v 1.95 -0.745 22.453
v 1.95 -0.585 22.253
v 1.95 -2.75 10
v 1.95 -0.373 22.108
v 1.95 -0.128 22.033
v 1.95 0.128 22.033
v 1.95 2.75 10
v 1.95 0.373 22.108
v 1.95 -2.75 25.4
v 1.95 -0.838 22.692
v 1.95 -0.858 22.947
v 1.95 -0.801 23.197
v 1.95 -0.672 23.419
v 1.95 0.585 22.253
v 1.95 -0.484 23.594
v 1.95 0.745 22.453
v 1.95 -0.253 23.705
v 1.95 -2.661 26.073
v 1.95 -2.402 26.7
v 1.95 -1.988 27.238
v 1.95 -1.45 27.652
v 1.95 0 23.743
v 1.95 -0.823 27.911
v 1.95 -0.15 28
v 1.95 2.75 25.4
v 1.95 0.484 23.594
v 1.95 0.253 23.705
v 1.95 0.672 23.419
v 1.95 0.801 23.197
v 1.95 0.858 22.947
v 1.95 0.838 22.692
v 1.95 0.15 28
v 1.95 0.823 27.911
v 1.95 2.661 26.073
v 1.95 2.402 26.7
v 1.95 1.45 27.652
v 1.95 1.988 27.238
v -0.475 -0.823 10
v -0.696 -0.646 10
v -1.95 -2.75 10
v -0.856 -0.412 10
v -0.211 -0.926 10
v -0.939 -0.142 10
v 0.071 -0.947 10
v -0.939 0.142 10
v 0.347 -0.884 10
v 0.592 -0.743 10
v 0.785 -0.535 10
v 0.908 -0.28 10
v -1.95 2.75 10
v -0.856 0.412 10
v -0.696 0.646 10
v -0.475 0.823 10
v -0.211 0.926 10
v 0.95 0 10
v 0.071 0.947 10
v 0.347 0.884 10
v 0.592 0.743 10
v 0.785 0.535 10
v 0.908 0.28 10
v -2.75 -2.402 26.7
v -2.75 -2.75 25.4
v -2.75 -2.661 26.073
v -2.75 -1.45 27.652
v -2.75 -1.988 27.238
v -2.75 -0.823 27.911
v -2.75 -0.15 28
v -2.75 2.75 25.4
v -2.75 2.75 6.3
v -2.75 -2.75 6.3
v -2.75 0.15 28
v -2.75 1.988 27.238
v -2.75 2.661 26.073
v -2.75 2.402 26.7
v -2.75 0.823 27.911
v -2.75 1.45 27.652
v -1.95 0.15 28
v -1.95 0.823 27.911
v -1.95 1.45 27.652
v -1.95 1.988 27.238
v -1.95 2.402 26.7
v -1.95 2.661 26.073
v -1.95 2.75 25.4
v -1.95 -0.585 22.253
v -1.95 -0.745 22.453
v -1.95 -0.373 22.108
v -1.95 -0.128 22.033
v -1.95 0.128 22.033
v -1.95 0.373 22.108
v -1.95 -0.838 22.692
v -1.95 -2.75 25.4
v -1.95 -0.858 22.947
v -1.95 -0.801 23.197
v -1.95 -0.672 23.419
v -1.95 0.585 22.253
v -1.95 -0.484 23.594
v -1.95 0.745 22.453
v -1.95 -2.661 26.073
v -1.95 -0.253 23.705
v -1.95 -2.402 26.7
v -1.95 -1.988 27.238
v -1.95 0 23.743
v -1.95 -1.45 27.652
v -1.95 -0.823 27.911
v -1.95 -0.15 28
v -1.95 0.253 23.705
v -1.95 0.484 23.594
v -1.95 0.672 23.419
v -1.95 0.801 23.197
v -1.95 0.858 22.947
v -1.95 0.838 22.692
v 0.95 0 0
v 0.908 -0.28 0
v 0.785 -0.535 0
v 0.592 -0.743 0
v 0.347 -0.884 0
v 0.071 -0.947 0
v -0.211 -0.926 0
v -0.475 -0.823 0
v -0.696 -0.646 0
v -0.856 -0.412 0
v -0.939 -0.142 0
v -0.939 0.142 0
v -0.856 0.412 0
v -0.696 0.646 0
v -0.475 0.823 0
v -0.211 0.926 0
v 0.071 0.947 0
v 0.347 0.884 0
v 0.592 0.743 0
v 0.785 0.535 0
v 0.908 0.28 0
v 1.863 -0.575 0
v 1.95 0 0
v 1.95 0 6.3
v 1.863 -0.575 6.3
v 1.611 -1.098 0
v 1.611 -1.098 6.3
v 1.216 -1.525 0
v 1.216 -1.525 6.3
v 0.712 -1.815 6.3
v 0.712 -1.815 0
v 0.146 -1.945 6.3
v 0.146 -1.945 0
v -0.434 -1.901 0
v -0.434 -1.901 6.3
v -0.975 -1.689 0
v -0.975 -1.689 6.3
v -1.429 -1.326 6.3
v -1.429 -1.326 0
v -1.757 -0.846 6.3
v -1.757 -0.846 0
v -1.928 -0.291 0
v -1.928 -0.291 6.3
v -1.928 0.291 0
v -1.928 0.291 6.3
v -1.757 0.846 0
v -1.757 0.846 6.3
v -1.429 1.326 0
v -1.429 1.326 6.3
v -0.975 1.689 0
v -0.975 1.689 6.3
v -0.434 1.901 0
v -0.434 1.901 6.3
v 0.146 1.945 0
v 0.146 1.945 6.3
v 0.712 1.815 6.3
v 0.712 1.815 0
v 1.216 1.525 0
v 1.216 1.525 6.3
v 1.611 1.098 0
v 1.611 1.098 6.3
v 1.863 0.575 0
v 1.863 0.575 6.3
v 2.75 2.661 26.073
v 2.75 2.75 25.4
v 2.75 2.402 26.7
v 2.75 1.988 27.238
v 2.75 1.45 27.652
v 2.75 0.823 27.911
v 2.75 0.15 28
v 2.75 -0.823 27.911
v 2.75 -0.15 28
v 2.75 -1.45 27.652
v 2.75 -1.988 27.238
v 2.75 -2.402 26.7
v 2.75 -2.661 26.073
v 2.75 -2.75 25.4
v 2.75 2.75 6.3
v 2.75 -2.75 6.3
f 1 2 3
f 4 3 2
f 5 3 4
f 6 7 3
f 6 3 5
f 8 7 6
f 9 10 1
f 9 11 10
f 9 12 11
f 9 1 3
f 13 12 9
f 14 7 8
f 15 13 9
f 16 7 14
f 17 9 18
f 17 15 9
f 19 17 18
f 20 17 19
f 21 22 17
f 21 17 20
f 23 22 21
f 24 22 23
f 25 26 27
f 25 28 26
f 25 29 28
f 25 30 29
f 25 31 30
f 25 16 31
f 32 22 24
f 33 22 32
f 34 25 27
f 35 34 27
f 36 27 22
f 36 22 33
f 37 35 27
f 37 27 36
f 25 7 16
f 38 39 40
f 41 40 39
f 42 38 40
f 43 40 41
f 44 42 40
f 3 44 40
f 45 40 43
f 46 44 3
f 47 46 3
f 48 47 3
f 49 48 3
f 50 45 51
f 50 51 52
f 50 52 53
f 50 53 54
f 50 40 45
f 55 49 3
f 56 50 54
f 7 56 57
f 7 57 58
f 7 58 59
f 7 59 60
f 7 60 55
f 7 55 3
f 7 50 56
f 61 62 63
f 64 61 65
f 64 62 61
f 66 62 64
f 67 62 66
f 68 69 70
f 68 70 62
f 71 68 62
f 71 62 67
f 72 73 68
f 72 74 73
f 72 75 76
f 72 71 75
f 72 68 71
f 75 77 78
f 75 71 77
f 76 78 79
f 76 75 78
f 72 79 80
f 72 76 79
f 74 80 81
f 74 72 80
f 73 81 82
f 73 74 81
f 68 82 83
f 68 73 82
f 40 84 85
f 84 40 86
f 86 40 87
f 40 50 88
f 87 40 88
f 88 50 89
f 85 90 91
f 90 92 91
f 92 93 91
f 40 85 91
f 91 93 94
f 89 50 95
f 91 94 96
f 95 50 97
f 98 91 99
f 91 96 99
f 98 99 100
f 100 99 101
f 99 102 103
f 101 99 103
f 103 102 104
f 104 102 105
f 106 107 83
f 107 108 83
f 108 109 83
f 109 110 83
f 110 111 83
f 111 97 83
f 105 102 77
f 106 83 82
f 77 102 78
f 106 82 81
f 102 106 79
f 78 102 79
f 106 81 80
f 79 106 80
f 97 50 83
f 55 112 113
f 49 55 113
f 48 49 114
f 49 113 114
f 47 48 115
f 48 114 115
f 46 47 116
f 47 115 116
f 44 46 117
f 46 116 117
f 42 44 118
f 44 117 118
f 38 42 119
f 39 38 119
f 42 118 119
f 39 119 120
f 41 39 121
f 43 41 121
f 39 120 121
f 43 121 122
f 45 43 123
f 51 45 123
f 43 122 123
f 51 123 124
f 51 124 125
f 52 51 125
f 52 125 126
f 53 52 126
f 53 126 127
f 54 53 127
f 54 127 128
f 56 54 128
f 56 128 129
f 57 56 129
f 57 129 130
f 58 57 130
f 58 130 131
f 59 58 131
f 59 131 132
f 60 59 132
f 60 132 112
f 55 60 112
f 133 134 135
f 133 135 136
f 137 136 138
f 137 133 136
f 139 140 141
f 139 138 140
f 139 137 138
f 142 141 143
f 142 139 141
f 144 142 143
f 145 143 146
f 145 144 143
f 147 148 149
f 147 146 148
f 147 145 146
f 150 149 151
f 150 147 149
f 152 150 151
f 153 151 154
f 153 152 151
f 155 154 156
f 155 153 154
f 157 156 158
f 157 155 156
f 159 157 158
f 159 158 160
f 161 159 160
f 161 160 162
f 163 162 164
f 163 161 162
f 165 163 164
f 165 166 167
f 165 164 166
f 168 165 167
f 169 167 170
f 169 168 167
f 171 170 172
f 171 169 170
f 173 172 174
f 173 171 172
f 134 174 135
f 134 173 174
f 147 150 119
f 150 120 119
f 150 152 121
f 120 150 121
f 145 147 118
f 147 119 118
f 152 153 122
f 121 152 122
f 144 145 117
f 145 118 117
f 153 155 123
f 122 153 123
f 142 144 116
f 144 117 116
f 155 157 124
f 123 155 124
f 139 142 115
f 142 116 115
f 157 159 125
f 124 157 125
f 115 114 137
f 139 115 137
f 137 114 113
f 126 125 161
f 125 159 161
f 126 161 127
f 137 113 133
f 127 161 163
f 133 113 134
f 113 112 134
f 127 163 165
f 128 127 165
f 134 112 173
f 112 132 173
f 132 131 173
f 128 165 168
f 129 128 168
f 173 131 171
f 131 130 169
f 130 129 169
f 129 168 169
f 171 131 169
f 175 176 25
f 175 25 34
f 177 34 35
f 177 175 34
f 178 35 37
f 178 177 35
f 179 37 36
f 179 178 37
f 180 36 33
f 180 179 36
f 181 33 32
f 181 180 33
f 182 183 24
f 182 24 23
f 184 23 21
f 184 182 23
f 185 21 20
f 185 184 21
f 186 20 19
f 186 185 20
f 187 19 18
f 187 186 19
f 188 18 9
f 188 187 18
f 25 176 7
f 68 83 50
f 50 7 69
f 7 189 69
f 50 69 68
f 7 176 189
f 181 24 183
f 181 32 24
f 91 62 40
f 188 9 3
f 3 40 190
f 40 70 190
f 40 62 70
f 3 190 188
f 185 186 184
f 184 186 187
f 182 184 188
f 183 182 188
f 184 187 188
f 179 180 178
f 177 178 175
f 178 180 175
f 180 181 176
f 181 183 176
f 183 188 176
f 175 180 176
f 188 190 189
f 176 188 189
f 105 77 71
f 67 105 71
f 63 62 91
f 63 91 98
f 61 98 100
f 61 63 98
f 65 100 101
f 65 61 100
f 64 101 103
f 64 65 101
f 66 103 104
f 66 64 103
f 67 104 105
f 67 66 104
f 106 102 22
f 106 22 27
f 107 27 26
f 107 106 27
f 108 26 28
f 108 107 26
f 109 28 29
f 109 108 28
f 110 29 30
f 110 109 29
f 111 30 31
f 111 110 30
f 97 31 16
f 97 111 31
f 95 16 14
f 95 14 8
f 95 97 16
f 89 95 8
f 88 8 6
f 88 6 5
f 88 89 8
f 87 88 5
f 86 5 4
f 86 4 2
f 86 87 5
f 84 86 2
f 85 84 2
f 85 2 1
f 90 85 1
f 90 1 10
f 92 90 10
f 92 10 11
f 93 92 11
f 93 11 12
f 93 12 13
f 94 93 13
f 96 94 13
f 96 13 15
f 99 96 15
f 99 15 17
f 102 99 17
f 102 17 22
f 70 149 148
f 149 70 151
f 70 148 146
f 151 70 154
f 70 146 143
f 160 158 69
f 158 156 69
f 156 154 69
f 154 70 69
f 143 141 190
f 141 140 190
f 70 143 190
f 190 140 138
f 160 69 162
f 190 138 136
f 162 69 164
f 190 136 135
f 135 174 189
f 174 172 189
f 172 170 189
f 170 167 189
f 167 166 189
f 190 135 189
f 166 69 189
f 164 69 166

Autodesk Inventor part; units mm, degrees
ref_plane "YZ Plane" through (0, 0, 0) normal (1, 0, 0) x (0, 1, 0)
ref_plane "XZ Plane" through (0, 0, 0) normal (0, 1, 0) x (-1, 0, 0)
ref_plane "XY Plane" through (0, 0, 0) normal (0, 0, 1) x (1, 0, 0)
sketch "Sketch1" plane through (0, 0, 0) normal (0, 0, 1) x (1, 0, 0)
  circle A0 centre (0, 0) radius 0.95
  circle A1 centre (0, 0) radius 1.95
  dimension "d0" = 1.9
  dimension "d1" = 3.9
extrude "Extrusion1" add sketch "Sketch1" along normal blind 6.3
sketch "Sketch2" plane through (0, 0, 6.3) normal (0, 0, 1) x (1, 0, 0)
  line L0 (-2.75, -2.75) -> (2.75, -2.75)
  line L1 (2.75, -2.75) -> (2.75, 2.75)
  line L2 (2.75, 2.75) -> (-2.75, 2.75)
  line L3 (-2.75, 2.75) -> (-2.75, -2.75)
  line L4 (-2.75, -2.75) -> (2.75, 2.75) construction
  line L5 (2.75, -2.75) -> (-2.75, 2.75) construction
  point P0 (0, 0)
  dimension "d4" = 5.5
  dimension "d5" = 5.5
extrude "Extrusion2" add sketch "Sketch2" along normal blind 3.7
extrude "Extrusion3" cut sketch "Sketch1" along normal through all contours A0
sketch "Sketch3" plane through (-2.75, 2.75, 6.3) normal (0, 1, 0) x (1, 0, 0)
  line L0 (0.8, 6.3) -> (0.8, 0) projected
  line L1 (0, 0) -> (0, -3.7) projected
  line L2 (0, -3.7) -> (5.5, -3.7) projected
  line L3 (0, -3.7) -> (0.8, -3.7)
  line L4 (6.7827, -4.1433) -> (6.7693, -4.1433)
  line L5 (0.8, -3.7) -> (0.8, -21.7)
  line L6 (0.8, -21.7) -> (0, -21.7)
  line L7 (0, -21.7) -> (0, -3.7)
  line L8 (2.75, -3.7) -> (2.75, -2.5481)
  line L9 (4.7, -3.7) -> (4.7, -21.7)
  line L10 (4.7, -21.7) -> (5.5, -21.7)
  line L11 (5.5, -21.7) -> (5.5, -3.7)
  point P0 (2.75, 6.3)
  dimension "d10" = 18
extrude "Extrusion4" add sketch "Sketch3" against normal up to surface (5.5 mm away)
sketch "Sketch4" plane through (-2.75, -2.75, 6.3) normal (-1, 0, 0) x (0, 0, 1)
  line L0 (21.7, 5.5) -> (21.7, 0) projected
  line L1 (21.7, 2.75) -> (19.1, 2.75)
  circle A0 centre (16.5832, 2.75) radius 0.86
  point P0 (-6.3, 2.75)
  dimension "d13" = 2.6
  dimension "d14" = 1.72
extrude "Extrusion5" add sketch "Sketch4" against normal up to surface (5.5 mm away)
fillet "Fillet1" radius 2.6 2 edges at (-2.35, -2.75, 28) (-2.35, 2.75, 28)
fillet "Fillet2" radius 2.6 2 edges at (2.35, 2.75, 28) (2.35, -2.75, 28)
properties part number "G"
